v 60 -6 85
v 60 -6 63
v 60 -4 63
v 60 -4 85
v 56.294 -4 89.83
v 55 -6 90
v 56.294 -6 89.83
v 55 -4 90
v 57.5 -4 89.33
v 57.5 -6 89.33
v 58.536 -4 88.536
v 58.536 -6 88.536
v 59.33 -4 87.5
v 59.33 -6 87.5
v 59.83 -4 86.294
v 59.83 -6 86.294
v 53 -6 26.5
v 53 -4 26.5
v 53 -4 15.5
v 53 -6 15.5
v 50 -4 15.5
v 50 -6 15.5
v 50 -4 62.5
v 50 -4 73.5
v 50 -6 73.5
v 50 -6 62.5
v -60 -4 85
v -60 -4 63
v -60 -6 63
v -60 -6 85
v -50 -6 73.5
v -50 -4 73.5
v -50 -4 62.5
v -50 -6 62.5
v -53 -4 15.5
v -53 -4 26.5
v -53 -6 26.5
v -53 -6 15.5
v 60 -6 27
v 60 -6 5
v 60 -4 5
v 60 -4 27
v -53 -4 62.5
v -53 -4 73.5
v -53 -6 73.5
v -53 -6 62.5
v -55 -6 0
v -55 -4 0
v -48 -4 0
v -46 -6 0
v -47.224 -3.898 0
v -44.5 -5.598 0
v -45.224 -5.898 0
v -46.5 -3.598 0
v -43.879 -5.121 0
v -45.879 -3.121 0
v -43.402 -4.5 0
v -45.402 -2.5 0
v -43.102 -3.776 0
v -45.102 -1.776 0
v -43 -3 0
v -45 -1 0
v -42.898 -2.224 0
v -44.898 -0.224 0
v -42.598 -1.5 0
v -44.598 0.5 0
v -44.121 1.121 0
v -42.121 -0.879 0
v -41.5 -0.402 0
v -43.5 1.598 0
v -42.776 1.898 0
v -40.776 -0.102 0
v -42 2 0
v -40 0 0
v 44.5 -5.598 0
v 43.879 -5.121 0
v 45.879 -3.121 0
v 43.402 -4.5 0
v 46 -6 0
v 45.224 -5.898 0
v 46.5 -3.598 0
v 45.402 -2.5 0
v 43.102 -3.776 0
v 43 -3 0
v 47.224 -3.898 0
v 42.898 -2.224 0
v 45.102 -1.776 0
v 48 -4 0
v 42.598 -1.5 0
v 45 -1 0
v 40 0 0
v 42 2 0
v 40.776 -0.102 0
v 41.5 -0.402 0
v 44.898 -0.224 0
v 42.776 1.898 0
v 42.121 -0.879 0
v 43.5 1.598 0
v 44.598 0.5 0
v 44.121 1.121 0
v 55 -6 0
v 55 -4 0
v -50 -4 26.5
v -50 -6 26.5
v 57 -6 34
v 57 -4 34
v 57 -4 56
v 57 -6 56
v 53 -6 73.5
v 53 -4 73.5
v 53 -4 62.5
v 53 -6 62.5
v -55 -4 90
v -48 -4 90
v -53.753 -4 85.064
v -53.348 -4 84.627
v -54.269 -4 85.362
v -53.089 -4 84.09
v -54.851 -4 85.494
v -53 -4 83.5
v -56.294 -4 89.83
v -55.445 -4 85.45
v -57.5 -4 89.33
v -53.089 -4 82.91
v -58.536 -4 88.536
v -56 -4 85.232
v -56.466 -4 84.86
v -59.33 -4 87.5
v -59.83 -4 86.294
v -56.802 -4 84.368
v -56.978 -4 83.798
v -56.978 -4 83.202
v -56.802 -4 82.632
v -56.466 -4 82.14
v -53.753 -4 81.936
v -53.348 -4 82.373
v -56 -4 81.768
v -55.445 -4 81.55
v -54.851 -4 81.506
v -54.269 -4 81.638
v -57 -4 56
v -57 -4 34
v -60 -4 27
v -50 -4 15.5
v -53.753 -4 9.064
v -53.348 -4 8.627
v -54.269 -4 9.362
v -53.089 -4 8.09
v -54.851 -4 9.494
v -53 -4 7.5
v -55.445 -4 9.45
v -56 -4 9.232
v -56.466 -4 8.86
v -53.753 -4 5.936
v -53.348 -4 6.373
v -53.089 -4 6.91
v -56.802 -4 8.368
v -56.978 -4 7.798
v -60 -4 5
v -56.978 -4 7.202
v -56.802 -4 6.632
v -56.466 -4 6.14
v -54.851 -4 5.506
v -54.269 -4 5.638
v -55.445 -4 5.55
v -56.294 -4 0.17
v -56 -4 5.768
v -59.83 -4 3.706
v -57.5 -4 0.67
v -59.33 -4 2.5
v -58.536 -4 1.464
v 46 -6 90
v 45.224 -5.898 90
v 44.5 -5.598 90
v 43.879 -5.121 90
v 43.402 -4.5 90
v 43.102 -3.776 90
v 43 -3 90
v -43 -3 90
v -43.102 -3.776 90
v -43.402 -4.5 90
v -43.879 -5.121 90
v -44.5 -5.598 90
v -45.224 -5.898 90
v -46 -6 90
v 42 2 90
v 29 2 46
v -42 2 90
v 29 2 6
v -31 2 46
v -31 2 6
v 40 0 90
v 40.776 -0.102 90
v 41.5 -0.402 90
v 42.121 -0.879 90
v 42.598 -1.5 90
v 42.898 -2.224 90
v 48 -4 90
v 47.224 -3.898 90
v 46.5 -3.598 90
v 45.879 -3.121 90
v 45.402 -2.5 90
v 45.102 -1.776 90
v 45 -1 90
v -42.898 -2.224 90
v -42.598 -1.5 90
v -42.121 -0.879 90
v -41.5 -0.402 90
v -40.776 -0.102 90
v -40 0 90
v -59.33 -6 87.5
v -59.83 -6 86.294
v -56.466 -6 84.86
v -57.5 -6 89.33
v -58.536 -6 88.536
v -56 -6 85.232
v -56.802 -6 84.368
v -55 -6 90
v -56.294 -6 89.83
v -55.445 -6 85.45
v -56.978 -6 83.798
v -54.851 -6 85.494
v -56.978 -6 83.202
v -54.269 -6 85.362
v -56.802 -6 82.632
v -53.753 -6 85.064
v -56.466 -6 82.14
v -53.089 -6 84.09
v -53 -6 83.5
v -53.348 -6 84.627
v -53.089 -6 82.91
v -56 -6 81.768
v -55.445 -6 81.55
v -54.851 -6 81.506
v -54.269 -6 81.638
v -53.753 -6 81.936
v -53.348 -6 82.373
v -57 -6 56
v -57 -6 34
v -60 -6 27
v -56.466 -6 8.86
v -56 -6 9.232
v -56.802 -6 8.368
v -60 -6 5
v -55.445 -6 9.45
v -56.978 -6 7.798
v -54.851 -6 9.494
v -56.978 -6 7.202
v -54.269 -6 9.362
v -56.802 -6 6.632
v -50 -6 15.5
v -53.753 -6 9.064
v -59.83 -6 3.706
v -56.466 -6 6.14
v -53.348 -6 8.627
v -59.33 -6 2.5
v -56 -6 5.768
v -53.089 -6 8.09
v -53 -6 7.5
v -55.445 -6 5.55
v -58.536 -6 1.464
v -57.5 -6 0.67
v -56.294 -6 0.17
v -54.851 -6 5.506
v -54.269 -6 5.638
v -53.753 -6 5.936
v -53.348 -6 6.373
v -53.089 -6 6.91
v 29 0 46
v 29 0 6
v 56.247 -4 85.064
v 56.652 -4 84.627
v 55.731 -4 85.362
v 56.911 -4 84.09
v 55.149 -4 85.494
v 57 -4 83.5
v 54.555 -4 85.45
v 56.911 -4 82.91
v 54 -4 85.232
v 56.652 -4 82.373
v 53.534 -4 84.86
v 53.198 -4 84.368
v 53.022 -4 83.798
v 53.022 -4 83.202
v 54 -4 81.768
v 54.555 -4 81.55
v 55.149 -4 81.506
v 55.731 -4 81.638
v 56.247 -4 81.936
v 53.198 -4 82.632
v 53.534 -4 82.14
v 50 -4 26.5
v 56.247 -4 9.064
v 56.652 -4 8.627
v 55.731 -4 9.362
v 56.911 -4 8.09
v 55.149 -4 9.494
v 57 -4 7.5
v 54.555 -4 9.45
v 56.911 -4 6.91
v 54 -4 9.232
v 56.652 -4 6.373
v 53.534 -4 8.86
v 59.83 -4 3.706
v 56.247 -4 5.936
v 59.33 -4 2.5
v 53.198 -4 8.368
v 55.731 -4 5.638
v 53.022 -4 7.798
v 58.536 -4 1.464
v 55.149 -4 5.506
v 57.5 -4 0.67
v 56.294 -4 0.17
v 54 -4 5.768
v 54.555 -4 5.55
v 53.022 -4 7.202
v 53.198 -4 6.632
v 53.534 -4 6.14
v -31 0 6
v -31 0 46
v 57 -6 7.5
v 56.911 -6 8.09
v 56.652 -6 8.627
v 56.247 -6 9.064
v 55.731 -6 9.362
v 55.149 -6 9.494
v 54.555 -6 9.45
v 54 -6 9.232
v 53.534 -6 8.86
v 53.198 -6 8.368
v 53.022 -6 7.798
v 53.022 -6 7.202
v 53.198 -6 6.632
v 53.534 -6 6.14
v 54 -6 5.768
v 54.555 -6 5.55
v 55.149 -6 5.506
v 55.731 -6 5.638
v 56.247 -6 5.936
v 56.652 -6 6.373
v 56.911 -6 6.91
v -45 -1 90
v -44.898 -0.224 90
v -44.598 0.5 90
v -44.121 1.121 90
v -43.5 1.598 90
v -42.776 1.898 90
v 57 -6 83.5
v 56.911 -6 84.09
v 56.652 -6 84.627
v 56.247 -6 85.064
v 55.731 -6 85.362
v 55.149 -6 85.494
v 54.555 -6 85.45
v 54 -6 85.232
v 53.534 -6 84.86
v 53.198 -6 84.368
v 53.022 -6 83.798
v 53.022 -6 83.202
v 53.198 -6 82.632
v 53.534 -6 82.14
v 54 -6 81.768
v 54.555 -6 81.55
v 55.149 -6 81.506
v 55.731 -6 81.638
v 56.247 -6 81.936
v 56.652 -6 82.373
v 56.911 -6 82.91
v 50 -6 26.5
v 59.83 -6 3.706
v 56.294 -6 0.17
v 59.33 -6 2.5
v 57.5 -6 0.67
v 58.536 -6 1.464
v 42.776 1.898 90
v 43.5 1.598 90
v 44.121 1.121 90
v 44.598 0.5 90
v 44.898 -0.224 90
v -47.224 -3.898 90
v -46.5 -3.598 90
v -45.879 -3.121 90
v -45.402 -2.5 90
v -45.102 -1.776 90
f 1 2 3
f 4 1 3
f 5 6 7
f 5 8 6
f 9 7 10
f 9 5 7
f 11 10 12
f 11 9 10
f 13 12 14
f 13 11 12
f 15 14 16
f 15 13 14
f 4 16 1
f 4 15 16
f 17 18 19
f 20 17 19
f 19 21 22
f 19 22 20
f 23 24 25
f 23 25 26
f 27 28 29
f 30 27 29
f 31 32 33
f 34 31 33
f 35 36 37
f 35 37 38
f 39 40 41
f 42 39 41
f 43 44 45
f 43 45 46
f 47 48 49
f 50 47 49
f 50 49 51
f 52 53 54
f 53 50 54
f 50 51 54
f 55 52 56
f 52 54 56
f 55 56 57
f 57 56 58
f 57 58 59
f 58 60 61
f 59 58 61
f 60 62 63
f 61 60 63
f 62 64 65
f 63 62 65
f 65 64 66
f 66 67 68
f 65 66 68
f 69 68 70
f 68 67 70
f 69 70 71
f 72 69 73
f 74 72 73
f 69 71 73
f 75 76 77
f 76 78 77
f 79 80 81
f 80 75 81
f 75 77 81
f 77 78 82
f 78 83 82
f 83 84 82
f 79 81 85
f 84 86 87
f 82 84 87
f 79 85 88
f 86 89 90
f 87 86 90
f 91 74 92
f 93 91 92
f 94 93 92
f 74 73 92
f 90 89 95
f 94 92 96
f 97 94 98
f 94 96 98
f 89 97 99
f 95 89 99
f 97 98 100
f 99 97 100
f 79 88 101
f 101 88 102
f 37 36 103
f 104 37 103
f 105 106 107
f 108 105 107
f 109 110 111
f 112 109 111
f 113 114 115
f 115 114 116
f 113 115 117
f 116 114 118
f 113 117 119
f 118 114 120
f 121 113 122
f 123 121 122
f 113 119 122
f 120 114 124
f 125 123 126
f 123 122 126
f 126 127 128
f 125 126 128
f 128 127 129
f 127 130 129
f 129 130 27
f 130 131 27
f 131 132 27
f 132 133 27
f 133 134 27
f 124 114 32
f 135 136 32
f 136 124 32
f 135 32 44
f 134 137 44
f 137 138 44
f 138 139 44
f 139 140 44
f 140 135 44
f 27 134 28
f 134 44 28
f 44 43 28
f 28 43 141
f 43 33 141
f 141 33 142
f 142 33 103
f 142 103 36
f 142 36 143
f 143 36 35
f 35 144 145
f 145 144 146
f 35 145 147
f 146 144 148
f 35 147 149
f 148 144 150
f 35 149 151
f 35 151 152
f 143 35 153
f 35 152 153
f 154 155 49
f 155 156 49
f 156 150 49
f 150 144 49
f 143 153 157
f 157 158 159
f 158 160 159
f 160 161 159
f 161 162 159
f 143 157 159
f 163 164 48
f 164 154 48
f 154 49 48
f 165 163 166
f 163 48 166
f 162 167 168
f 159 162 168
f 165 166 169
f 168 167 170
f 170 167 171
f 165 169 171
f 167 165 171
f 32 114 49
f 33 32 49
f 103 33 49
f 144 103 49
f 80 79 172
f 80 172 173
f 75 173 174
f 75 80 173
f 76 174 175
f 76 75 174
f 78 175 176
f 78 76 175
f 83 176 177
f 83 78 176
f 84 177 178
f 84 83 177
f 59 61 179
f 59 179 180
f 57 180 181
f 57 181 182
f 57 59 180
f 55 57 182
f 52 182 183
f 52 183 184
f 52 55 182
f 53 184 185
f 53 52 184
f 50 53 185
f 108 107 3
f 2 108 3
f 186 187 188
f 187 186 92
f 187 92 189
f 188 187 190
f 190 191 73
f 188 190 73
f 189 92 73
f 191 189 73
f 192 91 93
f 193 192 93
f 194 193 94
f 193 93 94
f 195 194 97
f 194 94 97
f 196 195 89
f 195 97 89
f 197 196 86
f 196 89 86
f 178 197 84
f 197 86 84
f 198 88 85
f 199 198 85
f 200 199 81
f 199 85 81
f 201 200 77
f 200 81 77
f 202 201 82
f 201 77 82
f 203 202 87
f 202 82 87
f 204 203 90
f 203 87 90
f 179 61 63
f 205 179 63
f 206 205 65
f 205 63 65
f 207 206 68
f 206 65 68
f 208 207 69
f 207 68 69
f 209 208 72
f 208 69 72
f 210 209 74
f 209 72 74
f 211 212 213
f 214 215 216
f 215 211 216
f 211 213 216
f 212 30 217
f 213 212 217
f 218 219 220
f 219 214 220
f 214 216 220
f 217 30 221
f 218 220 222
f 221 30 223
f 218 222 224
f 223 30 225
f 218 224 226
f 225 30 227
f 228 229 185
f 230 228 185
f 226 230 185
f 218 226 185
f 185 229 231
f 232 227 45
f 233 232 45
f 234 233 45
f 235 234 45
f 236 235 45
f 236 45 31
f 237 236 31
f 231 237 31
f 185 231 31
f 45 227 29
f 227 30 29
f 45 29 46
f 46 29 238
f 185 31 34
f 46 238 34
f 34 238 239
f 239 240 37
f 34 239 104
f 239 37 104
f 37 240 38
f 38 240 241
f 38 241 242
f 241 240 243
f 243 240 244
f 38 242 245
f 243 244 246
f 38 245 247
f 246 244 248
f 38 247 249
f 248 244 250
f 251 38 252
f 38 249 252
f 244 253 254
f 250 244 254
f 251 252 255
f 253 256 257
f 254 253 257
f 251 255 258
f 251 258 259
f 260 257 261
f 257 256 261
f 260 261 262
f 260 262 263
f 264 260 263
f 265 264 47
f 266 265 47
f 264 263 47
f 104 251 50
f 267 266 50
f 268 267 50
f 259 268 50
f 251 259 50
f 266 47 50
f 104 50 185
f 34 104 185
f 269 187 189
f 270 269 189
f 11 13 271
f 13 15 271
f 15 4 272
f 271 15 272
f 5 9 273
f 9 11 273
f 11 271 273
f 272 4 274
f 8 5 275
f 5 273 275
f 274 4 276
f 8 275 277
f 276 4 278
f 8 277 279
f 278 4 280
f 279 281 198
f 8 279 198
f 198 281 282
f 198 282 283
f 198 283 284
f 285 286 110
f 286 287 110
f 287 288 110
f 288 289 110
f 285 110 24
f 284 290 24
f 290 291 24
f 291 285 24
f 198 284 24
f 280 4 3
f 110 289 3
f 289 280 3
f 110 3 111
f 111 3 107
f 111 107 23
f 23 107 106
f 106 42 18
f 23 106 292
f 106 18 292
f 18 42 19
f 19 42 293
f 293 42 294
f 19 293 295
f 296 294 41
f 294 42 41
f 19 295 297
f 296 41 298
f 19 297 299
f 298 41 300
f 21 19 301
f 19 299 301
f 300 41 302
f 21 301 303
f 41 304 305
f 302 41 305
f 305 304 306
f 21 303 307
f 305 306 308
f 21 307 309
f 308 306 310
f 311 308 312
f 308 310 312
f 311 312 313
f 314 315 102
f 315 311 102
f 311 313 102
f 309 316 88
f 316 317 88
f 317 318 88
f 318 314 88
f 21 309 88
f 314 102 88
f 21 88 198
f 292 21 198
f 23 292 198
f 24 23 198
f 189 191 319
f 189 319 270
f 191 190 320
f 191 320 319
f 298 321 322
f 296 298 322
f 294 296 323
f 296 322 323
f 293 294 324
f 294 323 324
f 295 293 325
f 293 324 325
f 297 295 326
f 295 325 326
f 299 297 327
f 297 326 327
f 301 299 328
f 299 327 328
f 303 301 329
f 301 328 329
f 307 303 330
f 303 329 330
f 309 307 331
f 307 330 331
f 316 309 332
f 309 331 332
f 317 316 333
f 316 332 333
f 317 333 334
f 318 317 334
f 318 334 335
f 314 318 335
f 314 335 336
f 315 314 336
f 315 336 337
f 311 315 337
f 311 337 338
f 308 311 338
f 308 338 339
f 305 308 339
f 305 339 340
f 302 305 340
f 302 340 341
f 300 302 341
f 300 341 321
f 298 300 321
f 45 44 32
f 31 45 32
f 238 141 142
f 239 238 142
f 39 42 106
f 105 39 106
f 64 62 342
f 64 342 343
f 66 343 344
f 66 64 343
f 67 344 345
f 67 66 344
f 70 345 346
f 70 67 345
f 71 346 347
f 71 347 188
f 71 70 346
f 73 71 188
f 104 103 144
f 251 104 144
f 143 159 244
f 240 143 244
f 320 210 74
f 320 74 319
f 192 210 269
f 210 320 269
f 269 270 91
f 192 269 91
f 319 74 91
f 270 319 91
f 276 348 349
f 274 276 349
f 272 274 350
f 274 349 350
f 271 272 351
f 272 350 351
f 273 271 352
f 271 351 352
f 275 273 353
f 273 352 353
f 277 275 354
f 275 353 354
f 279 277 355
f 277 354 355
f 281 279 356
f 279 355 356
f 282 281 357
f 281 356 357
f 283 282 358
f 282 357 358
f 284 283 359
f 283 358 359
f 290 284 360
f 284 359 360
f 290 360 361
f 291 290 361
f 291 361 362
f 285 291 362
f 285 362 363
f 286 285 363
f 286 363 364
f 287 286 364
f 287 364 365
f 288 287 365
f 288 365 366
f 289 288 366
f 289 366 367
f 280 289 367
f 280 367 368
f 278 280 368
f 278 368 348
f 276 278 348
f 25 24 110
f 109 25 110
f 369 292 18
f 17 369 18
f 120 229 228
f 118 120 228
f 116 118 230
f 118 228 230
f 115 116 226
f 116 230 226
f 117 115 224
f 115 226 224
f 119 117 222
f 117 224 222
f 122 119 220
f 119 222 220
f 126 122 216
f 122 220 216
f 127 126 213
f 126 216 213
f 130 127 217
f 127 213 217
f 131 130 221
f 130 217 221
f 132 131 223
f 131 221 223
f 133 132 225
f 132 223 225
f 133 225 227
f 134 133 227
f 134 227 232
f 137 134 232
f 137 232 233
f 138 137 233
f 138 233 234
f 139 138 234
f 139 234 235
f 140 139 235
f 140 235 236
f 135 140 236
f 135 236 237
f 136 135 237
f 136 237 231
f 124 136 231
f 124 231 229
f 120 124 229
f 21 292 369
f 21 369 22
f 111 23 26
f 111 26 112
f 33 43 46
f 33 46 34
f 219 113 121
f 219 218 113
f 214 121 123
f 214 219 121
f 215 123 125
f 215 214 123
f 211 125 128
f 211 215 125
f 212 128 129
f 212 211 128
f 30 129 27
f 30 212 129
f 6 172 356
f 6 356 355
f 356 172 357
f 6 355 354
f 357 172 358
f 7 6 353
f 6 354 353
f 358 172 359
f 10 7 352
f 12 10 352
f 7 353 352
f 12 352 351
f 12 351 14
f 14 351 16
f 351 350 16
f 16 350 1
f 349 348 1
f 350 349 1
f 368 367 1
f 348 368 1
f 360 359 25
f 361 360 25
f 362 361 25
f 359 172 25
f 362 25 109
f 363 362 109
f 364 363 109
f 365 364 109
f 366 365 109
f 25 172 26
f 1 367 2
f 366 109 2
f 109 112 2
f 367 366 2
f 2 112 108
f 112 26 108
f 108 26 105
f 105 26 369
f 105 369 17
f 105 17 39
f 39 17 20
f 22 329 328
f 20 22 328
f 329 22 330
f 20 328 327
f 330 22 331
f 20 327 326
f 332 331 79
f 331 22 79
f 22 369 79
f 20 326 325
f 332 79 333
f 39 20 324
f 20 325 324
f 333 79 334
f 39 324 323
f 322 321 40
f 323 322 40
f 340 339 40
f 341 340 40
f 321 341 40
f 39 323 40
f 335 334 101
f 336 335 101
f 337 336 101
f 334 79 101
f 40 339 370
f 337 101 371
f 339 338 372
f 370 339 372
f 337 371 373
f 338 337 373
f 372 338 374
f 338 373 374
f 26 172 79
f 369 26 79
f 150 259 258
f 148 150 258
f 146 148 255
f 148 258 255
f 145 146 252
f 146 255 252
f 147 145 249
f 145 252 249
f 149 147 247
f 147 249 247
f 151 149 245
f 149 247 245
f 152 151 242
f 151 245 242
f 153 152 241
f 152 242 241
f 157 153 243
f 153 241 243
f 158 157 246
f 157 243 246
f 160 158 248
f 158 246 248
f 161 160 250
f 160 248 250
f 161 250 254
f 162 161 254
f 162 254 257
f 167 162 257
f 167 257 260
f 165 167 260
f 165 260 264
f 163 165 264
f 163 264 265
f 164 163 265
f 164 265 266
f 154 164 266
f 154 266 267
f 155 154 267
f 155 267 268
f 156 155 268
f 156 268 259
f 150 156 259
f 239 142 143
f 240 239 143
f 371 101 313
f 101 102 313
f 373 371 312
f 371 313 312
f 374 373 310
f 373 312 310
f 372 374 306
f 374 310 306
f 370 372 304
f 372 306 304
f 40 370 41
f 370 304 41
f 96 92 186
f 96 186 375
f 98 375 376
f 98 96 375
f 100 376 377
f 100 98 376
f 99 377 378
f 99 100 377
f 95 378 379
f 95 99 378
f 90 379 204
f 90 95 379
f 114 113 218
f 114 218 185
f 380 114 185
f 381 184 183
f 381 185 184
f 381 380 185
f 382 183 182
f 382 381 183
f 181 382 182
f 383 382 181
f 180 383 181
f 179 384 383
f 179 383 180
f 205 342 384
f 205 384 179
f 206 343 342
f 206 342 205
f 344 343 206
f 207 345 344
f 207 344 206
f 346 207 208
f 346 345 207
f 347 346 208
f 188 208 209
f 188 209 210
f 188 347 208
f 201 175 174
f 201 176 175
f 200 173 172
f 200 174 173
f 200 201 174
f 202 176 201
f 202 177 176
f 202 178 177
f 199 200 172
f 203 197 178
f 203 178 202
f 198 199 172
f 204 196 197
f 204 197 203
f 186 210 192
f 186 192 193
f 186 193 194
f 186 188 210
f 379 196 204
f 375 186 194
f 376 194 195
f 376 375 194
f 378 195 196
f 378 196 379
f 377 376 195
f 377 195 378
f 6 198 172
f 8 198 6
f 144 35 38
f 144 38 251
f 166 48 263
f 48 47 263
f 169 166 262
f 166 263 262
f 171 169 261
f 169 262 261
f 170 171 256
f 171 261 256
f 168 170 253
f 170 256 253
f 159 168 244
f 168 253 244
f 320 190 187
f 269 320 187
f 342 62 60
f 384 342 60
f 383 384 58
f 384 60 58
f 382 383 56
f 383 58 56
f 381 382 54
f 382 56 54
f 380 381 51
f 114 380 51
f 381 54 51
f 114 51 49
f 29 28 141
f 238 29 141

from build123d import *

# Parameters (mm, degrees)
EXTRUDE_1_DEPTH     = 90
SKETCH_2_W          = 3
SKETCH_2_H          = 11
SKETCH_2_W_2        = 60
SKETCH_2_H_2        = 40
CUT_EXTRUDE_1_DEPTH = 109.461974904
CUT_EXTRUDE_2_REACH = 110.462
SKETCH_3_R          = 2
FILLET_1_R          = 5
FILLET_2_DEPTH      = 90
FILLET_2_2_DEPTH    = 90
CUT_EXTRUDE_3_REACH = 110.333


with BuildPart() as part:
    # 草图1 → 凸台-拉伸1 (new body)
    with BuildSketch(Plane.XY):
        Polygon((-43, 0), (43, 0), (43, -6), (60, -6), (60, -4), (45, -4), (45, 2), (-45, 2), (-45, -4), (-60, -4), (-60, -6), (-43, -6), align=None)
    extrude(amount=EXTRUDE_1_DEPTH)

    # 草图2 → 切除-拉伸1 (cut, through all)
    with BuildSketch(Plane(origin=(0, 2, 0), x_dir=(1, 0, 0), z_dir=(0, 1, 0))):
        with Locations((51.5, -21)):
            Rectangle(SKETCH_2_W, SKETCH_2_H)
        with Locations((51.5, -68)):
            Rectangle(SKETCH_2_W, SKETCH_2_H)
        with Locations((-51.5, -21)):
            Rectangle(SKETCH_2_W, SKETCH_2_H)
        with Locations((-51.5, -68)):
            Rectangle(SKETCH_2_W, SKETCH_2_H)
        with Locations((-1, -26)):
            Rectangle(SKETCH_2_W_2, SKETCH_2_H_2)
    extrude(amount=-CUT_EXTRUDE_1_DEPTH, mode=Mode.SUBTRACT)

    # 草图3 → 切除-拉伸2 (cut, up to next)
    with BuildSketch(Plane.XZ.offset(6), mode=Mode.PRIVATE) as cut_extrude_2_sk1:
        with Locations((55, 7.5)):
            Circle(SKETCH_3_R)
    cut_extrude_2_tool1 = extrude(cut_extrude_2_sk1.sketch, amount=-CUT_EXTRUDE_2_REACH, mode=Mode.PRIVATE) & part.part
    # 草图3 → 切除-拉伸2 (cut, up to next)
    with BuildSketch(Plane.XZ.offset(6), mode=Mode.PRIVATE) as cut_extrude_2_sk2:
        with Locations((55, 83.5)):
            Circle(SKETCH_3_R)
    cut_extrude_2_tool2 = extrude(cut_extrude_2_sk2.sketch, amount=-CUT_EXTRUDE_2_REACH, mode=Mode.PRIVATE) & part.part
    # 草图3 → 切除-拉伸2 (cut, up to next)
    with BuildSketch(Plane.XZ.offset(6), mode=Mode.PRIVATE) as cut_extrude_2_sk3:
        with Locations((-55, 83.5)):
            Circle(SKETCH_3_R)
    cut_extrude_2_tool3 = extrude(cut_extrude_2_sk3.sketch, amount=-CUT_EXTRUDE_2_REACH, mode=Mode.PRIVATE) & part.part
    # 草图3 → 切除-拉伸2 (cut, up to next)
    with BuildSketch(Plane.XZ.offset(6), mode=Mode.PRIVATE) as cut_extrude_2_sk4:
        with Locations((-55, 7.5)):
            Circle(SKETCH_3_R)
    cut_extrude_2_tool4 = extrude(cut_extrude_2_sk4.sketch, amount=-CUT_EXTRUDE_2_REACH, mode=Mode.PRIVATE) & part.part
    add(cut_extrude_2_tool1.solids().sort_by_distance((55, -6, 7.5))[0], mode=Mode.SUBTRACT)
    add(cut_extrude_2_tool2.solids().sort_by_distance((55, -6, 83.5))[0], mode=Mode.SUBTRACT)
    add(cut_extrude_2_tool3.solids().sort_by_distance((-55, -6, 83.5))[0], mode=Mode.SUBTRACT)
    add(cut_extrude_2_tool4.solids().sort_by_distance((-55, -6, 7.5))[0], mode=Mode.SUBTRACT)

    # 圆角1
    fillet_1_edges = [part.edges().sort_by_distance(p)[0] for p in [
        (60, -5, 0),
        (-60, -5, 0),
        (60, -5, 90),
        (-60, -5, 90),
    ]]
    fillet(fillet_1_edges, radius=FILLET_1_R)

    # 圆角2: read off the stored shape, not the designer's step
    # 圆角2 outline → 圆角2 (cut)
    with BuildSketch(Plane.XY):
        with BuildLine():
            Line((-43, -6), (-43, -3))
            ThreePointArc((-43, -3), (-43.878679656, -5.121320344), (-46, -6))
            Line((-46, -6), (-43, -6))
        make_face()
        with BuildLine():
            ThreePointArc((46, -6), (43.878679656, -5.121320344), (43, -3))
            Line((43, -3), (43, -6))
            Line((43, -6), (46, -6))
        make_face()
        with BuildLine():
            Line((45, 2), (42, 2))
            ThreePointArc((42, 2), (44.121320344, 1.121320344), (45, -1))
            Line((45, -1), (45, 2))
        make_face()
        with BuildLine():
            ThreePointArc((-45, -1), (-44.121320344, 1.121320344), (-42, 2))
            Line((-42, 2), (-45, 2))
            Line((-45, 2), (-45, -1))
        make_face()
    extrude(amount=FILLET_2_DEPTH, mode=Mode.SUBTRACT)

    # Fillet 2 2 outline → Fillet 2 2 (add)
    with BuildSketch(Plane.XY):
        with BuildLine():
            ThreePointArc((-43, -3), (-42.121320344, -0.878679656), (-40, 0))
            Line((-40, 0), (-43, 0))
            Line((-43, 0), (-43, -3))
        make_face()
        with BuildLine():
            ThreePointArc((40, 0), (42.121320344, -0.878679656), (43, -3))
            Line((43, -3), (43, 0))
            Line((43, 0), (40, 0))
        make_face()
        with BuildLine():
            Line((-45, -4), (-45, -1))
            ThreePointArc((-45, -1), (-45.878679656, -3.121320344), (-48, -4))
            Line((-48, -4), (-45, -4))
        make_face()
        with BuildLine():
            ThreePointArc((48, -4), (45.878679656, -3.121320344), (45, -1))
            Line((45, -1), (45, -4))
            Line((45, -4), (48, -4))
        make_face()
    extrude(amount=FILLET_2_2_DEPTH)

    # 草图4 → 切除-拉伸3 (cut, up to next)
    with BuildSketch(Plane(origin=(0, -4, 0), x_dir=(1, 0, 0), z_dir=(0, 1, 0)), mode=Mode.PRIVATE) as cut_extrude_3_sk1:
        Polygon((60, -27), (57, -34), (57, -56), (60, -63), align=None)
    cut_extrude_3_tool1 = extrude(cut_extrude_3_sk1.sketch, amount=-CUT_EXTRUDE_3_REACH, mode=Mode.PRIVATE) & part.part
    # 草图4 → 切除-拉伸3 (cut, up to next)
    with BuildSketch(Plane(origin=(0, -4, 0), x_dir=(1, 0, 0), z_dir=(0, 1, 0)), mode=Mode.PRIVATE) as cut_extrude_3_sk2:
        Polygon((-60, -63), (-57, -56), (-57, -34), (-60, -27), align=None)
    cut_extrude_3_tool2 = extrude(cut_extrude_3_sk2.sketch, amount=-CUT_EXTRUDE_3_REACH, mode=Mode.PRIVATE) & part.part
    add(cut_extrude_3_tool1.solids().sort_by_distance((58.62069, -4, 45))[0], mode=Mode.SUBTRACT)
    add(cut_extrude_3_tool2.solids().sort_by_distance((-58.62069, -4, 45))[0], mode=Mode.SUBTRACT)


solid = part.part
